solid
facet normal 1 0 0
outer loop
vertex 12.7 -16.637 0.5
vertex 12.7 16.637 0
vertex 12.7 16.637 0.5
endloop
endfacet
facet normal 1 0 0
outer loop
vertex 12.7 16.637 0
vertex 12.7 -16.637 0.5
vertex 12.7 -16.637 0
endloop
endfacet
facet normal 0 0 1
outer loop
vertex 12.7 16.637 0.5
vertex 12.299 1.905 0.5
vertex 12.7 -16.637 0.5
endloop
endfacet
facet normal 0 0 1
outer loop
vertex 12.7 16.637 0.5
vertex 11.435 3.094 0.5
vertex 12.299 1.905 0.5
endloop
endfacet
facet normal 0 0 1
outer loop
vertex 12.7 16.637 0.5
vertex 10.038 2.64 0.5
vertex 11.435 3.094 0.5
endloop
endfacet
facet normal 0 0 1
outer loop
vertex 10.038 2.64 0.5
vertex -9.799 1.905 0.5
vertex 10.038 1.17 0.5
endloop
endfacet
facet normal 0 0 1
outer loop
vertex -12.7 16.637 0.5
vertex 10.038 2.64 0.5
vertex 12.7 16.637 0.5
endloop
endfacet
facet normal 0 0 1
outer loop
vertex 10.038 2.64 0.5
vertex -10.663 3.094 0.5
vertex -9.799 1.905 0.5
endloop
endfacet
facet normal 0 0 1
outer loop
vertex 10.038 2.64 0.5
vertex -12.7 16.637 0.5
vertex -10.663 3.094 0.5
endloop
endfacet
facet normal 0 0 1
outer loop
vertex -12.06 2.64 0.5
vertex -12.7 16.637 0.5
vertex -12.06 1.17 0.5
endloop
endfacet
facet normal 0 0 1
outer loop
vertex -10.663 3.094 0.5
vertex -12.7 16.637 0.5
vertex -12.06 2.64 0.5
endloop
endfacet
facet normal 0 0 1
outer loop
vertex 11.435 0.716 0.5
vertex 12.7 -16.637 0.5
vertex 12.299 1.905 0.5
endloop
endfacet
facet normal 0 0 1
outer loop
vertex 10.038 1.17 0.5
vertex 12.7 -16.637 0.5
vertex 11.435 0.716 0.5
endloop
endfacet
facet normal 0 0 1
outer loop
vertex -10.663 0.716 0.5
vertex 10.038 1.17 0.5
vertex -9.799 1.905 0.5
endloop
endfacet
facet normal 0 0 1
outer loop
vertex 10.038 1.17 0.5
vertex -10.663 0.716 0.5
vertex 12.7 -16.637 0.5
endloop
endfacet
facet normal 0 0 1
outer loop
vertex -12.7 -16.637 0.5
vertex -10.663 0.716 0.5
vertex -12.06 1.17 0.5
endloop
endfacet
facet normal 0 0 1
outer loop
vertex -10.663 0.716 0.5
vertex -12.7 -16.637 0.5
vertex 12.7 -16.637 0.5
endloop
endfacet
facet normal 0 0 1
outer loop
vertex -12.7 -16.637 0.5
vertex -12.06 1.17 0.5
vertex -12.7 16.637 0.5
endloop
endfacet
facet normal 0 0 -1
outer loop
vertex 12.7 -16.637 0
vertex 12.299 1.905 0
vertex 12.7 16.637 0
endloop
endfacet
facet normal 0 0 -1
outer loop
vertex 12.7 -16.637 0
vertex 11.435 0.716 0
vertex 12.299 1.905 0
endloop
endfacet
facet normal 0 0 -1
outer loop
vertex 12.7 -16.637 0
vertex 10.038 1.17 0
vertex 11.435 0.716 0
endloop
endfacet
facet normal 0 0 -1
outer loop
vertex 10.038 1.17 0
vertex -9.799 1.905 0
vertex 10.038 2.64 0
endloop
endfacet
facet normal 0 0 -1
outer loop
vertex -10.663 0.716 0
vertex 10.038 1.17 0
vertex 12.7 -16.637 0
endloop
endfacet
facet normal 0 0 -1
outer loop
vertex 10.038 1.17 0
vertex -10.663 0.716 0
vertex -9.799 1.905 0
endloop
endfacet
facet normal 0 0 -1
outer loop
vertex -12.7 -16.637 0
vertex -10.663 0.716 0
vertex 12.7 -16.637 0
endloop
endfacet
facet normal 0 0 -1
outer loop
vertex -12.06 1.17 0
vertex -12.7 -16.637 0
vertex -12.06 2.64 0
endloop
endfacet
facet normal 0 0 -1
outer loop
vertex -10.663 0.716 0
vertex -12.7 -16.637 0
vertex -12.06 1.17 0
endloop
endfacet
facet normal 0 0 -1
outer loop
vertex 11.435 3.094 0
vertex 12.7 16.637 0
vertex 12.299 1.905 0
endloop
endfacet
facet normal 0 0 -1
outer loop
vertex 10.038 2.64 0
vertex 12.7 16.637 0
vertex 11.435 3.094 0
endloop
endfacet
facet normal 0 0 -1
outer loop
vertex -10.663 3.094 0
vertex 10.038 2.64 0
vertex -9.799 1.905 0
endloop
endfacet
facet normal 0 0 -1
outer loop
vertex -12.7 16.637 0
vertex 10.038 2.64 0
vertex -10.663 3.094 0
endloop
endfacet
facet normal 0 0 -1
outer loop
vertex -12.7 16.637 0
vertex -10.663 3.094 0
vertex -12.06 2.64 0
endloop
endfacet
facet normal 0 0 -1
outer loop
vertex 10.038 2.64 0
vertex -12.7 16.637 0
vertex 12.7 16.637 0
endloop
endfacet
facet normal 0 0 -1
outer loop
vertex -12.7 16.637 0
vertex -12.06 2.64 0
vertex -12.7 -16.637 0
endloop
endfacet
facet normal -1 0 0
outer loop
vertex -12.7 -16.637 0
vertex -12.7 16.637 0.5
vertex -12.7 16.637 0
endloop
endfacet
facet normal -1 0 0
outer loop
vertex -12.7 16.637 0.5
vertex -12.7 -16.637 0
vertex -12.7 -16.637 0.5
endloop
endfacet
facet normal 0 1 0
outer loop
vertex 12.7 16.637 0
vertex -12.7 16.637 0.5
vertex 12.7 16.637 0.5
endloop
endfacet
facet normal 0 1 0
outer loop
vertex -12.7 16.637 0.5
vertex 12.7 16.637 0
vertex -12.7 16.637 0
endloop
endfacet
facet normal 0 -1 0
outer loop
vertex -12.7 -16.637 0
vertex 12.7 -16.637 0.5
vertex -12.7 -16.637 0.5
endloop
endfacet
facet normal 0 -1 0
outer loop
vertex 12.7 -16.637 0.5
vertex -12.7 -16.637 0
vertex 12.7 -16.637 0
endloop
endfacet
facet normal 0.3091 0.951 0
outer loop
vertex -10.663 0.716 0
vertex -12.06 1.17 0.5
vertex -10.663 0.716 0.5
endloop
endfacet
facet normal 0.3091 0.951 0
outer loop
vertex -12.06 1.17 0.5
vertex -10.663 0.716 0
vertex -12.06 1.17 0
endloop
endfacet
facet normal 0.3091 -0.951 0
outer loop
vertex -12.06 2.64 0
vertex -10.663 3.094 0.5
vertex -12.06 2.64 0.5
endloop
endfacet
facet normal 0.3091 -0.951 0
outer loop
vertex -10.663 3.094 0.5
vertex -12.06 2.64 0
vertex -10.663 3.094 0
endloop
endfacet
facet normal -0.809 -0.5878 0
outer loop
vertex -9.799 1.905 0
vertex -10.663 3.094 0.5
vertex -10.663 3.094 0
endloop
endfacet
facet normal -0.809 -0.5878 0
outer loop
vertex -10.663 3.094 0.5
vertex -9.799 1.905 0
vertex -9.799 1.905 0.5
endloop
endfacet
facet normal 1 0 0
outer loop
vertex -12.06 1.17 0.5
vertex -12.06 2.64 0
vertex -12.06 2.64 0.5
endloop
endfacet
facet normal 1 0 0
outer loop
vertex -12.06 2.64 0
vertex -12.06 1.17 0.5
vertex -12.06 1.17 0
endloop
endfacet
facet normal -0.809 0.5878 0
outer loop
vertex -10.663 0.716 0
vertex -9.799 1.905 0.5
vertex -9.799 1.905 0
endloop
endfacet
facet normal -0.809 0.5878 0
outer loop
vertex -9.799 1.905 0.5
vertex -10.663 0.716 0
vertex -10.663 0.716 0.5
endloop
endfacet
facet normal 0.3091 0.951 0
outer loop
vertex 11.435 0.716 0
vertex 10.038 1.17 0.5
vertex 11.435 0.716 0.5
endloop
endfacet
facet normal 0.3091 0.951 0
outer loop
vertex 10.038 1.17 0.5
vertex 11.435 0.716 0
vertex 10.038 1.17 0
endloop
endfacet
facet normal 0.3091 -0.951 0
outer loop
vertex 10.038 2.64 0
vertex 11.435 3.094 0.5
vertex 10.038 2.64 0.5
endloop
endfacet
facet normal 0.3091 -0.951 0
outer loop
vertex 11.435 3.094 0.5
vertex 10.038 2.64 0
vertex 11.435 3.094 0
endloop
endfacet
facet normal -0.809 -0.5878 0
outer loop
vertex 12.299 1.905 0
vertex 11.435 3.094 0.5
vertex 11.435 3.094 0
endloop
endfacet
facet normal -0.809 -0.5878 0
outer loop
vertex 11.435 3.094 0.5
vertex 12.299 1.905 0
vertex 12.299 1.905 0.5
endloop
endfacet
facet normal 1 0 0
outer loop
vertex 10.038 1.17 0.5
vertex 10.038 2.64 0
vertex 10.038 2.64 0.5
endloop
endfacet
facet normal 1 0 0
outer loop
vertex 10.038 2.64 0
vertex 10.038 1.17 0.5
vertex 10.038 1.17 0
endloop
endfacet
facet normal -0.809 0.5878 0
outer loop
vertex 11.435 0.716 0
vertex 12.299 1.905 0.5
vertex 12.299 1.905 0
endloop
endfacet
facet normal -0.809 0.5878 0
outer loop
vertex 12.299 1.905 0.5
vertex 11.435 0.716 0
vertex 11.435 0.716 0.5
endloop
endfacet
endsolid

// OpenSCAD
width=25.400;
length=33.274;
height=0.5;
translate([-width/2, -length/2, 0]) 
difference() { 
	translate([0, 0, 0]) cube([width,length,height]); 
	translate([1.651, 18.542,0]) cylinder(100,1.25,1.25);
	translate([23.749, 18.542,0]) cylinder(100,1.25,1.25);
}
